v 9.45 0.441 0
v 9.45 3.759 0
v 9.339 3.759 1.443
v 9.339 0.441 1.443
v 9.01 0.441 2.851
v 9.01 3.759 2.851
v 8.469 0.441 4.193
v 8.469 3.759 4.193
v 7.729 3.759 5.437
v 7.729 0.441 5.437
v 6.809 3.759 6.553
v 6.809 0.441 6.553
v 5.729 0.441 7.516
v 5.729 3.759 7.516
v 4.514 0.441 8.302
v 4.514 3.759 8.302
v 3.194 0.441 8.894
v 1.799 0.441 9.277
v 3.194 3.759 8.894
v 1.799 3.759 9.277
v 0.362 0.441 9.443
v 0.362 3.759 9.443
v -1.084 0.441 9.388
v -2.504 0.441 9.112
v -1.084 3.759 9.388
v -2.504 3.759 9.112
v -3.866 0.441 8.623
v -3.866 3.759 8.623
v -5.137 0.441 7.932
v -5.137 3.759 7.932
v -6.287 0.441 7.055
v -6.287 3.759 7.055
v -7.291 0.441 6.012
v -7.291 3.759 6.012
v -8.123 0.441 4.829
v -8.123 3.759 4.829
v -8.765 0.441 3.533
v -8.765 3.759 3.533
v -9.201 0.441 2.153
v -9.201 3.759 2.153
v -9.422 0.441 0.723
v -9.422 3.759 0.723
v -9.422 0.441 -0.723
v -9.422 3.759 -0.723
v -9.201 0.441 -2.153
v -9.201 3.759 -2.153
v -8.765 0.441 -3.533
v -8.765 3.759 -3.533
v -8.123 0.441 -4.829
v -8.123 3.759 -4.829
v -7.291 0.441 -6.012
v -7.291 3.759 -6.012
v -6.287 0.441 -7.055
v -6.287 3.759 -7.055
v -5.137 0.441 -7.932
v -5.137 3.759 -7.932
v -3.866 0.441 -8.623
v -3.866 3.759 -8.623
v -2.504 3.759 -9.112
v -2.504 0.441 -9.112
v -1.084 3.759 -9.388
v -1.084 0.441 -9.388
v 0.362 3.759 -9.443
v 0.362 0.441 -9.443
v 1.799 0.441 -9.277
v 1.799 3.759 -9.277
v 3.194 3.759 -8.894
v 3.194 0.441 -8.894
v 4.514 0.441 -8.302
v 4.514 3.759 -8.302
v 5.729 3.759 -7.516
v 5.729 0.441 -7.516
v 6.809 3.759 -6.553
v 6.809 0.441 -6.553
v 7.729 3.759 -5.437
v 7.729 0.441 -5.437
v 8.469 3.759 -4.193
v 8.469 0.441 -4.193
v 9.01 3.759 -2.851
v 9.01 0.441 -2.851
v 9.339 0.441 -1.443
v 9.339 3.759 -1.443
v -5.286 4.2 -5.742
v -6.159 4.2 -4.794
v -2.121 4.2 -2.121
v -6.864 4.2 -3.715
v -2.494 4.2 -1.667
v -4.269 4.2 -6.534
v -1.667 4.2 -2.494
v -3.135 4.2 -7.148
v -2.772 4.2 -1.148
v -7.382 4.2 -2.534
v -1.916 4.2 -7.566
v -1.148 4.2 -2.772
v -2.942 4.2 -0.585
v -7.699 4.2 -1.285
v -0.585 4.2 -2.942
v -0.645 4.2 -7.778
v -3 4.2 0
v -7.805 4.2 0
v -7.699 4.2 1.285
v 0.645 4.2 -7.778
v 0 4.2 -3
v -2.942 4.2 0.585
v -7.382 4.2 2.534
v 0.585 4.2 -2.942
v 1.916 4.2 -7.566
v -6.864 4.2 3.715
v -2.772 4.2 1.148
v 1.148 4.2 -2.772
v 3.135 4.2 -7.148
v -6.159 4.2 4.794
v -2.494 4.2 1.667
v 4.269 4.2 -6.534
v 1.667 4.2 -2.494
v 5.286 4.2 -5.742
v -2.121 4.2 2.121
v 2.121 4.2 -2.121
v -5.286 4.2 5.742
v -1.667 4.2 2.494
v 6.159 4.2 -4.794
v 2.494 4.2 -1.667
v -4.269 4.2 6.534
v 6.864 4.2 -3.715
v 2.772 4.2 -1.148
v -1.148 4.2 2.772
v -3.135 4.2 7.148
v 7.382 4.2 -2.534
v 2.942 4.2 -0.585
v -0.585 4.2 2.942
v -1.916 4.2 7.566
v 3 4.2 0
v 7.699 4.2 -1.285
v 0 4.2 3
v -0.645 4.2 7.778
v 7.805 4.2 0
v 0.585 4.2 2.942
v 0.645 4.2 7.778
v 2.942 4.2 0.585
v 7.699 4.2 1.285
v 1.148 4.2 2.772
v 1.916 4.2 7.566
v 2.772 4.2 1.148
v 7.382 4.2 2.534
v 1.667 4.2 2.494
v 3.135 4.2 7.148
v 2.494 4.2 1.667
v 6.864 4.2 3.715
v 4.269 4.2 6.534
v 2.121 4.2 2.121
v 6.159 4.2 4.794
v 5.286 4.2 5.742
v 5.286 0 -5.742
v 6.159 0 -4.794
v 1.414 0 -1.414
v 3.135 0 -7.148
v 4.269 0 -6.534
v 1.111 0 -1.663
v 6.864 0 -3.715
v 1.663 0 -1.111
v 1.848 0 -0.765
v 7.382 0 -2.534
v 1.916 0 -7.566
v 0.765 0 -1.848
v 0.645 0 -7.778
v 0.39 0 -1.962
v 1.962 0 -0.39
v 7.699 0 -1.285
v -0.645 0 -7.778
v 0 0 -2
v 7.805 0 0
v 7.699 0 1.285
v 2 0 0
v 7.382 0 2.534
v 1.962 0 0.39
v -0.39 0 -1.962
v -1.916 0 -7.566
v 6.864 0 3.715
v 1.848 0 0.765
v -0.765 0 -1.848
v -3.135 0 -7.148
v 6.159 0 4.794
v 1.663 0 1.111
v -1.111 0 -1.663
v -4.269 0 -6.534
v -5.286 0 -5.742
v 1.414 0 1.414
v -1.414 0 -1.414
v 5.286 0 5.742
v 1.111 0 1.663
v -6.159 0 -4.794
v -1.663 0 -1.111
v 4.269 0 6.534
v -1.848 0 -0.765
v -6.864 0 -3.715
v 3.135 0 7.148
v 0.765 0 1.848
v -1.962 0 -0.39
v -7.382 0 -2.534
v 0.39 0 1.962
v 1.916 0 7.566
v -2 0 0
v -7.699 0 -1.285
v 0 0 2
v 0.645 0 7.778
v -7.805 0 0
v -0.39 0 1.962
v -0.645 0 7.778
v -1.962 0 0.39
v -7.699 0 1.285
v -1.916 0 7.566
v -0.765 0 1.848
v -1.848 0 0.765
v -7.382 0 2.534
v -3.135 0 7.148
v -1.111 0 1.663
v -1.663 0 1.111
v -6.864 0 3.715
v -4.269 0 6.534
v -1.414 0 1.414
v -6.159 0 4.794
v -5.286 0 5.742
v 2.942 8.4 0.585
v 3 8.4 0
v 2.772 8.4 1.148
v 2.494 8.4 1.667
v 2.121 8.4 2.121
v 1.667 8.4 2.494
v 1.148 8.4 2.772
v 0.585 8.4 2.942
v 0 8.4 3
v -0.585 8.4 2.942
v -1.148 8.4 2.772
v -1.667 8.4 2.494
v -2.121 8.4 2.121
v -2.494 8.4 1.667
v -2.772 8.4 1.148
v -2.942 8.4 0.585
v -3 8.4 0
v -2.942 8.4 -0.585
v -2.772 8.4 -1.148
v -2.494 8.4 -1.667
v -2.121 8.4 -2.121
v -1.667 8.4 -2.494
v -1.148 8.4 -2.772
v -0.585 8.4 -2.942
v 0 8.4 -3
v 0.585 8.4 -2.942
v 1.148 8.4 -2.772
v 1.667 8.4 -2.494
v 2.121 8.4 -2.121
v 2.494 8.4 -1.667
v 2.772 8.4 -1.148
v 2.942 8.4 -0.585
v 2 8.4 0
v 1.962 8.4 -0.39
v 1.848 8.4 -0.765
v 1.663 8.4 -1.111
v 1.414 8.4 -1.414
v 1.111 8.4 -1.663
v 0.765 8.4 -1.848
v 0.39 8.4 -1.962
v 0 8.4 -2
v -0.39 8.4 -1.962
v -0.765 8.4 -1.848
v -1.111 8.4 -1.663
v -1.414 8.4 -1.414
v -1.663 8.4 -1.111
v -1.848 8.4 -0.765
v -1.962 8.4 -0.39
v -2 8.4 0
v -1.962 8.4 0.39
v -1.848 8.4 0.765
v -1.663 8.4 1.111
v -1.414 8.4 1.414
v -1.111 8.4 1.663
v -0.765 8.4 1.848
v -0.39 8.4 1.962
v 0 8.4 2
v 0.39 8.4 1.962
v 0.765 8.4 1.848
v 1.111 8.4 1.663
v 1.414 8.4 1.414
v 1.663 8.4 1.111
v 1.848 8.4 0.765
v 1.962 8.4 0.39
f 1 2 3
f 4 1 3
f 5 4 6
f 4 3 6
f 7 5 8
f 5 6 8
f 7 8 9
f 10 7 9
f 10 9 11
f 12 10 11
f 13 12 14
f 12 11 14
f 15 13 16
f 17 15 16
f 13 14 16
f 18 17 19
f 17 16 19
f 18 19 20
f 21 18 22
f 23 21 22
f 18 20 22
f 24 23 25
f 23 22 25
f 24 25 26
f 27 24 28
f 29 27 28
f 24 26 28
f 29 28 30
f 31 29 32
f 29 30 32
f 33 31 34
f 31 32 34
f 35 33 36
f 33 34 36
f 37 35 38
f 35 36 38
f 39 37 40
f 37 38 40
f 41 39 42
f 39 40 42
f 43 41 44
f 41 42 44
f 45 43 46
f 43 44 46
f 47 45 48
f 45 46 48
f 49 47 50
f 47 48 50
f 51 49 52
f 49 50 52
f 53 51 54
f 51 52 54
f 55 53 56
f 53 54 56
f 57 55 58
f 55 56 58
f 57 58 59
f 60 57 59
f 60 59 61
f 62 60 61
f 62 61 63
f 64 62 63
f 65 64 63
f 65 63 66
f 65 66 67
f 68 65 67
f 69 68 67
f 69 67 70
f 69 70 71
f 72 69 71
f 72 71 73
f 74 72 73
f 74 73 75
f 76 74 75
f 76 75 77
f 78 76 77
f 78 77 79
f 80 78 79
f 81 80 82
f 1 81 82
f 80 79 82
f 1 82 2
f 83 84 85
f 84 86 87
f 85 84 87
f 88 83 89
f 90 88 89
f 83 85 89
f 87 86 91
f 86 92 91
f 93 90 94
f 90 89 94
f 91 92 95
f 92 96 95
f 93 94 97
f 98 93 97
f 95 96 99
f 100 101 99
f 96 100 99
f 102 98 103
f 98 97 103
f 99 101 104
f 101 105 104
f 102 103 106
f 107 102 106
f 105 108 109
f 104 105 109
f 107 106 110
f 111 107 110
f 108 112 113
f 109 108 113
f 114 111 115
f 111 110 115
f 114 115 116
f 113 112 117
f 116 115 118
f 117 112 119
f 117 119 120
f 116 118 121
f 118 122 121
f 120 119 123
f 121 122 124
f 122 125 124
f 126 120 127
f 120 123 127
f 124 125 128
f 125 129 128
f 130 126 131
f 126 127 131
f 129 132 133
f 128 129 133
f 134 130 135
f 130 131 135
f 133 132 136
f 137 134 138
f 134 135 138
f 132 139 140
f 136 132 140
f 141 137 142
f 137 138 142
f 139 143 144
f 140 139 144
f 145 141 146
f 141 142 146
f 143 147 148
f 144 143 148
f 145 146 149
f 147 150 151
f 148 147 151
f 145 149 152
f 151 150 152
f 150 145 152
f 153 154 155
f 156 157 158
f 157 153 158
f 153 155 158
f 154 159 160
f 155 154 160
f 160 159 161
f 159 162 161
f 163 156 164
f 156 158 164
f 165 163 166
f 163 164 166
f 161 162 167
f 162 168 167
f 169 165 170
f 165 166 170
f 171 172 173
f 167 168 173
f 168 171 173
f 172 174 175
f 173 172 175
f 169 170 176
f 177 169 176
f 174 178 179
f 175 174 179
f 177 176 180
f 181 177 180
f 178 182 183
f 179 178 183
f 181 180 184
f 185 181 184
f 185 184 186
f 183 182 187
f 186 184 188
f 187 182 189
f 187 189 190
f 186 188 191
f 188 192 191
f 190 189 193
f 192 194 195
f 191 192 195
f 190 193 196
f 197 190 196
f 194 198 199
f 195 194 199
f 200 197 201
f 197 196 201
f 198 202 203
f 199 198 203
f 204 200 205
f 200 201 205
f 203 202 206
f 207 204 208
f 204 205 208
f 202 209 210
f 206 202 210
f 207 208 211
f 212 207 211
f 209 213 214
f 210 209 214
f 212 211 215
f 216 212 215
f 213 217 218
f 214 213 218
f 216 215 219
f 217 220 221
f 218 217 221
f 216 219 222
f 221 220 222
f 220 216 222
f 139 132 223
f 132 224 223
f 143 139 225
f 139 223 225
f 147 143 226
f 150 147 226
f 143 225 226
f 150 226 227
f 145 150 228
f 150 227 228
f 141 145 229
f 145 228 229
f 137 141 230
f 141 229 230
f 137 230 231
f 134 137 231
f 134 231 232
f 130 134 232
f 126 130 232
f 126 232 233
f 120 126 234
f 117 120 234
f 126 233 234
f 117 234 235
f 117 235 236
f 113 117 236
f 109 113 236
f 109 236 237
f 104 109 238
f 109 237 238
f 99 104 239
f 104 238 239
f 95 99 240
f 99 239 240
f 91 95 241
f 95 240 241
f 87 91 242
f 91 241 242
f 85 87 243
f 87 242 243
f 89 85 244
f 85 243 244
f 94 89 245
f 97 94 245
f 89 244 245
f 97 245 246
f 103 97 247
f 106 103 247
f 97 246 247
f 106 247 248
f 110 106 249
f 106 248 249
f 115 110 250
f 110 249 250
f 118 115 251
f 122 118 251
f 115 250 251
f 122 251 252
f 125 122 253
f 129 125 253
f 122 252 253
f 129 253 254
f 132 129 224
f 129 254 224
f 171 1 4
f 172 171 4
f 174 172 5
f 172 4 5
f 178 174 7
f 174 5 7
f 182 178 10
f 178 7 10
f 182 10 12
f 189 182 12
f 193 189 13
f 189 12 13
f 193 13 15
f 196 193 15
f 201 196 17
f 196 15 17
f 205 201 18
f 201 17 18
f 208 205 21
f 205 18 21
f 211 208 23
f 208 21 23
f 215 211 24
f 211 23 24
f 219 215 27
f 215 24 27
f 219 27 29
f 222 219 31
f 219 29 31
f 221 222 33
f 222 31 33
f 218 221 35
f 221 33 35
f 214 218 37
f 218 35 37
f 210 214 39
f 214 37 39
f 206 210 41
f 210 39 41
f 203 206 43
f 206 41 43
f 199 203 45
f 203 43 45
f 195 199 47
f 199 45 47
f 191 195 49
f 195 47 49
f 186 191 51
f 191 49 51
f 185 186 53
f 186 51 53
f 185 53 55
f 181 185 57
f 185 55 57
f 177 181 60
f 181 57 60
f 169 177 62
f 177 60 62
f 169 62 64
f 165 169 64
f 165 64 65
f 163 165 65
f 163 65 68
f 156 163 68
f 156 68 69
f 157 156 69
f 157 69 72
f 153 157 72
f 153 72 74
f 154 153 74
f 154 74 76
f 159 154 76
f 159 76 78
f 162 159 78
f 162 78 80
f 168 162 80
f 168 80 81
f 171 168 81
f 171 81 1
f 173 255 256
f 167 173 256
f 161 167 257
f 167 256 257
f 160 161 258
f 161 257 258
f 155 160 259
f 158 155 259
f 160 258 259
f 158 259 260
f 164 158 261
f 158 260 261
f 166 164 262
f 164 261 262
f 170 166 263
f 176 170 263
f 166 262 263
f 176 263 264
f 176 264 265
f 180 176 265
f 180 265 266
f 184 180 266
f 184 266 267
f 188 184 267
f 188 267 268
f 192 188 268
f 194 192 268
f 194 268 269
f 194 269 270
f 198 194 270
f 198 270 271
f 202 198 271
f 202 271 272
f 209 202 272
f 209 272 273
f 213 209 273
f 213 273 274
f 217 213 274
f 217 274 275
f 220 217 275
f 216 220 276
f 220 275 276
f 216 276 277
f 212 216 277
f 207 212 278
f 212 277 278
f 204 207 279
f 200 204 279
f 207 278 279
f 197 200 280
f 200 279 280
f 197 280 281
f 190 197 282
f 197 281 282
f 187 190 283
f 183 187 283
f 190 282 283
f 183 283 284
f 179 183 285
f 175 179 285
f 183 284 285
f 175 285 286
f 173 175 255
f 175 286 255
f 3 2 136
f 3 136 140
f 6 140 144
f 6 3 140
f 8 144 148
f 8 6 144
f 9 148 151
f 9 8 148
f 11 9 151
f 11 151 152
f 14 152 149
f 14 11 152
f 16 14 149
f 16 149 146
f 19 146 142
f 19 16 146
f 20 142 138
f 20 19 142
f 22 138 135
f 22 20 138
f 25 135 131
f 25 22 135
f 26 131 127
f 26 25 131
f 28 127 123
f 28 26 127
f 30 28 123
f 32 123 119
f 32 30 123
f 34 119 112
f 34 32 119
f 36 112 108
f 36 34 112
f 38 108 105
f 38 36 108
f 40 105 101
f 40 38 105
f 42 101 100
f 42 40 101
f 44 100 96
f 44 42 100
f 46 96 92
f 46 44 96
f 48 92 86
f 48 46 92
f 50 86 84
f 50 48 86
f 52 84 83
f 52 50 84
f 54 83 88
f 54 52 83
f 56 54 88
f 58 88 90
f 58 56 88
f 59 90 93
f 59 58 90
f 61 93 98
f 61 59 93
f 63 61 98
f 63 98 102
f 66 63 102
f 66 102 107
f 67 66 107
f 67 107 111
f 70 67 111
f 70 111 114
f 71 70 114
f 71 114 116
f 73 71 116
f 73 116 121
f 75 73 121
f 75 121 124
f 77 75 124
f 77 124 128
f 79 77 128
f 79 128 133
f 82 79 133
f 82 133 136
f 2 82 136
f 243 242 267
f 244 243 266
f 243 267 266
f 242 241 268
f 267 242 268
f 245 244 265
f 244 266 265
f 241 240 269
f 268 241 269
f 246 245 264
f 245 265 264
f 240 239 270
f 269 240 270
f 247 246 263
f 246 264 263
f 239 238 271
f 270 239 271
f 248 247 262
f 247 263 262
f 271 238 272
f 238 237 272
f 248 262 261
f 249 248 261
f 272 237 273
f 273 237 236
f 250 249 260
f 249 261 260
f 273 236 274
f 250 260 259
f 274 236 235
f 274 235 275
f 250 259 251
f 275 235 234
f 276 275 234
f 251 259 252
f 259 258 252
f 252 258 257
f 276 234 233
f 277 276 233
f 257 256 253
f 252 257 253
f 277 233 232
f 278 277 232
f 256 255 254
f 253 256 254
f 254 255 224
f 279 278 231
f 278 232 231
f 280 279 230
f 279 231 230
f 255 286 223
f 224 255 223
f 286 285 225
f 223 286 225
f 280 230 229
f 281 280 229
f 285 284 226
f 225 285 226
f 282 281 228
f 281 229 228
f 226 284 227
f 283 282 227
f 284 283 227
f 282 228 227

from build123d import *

# Parameters (mm, degrees)
CHAMFER_2_SIZE           = 1.645
CHAMFER_2_SIZE2          = 0.440776422
CHAMFER_3_SIZE           = 1.645
CHAMFER_3_SIZE2          = 0.440776422
SKETCH_4_R               = 2
CUT_EXTRUDE_2_DEPTH      = 1
CUT_EXTRUDE_2_DEPTH_BACK = 9.4


with BuildPart() as part:
    # Эскиз2 → Повернуть2 (revolve)
    with BuildSketch(Plane.XY):
        Polygon((0, 0), (9.45, 0), (9.45, 4.2), (3, 4.2), (3, 8.4), (0, 8.4), align=None)
    revolve(axis=Axis((0, 8.4, 0), (0, -1, 0)))

    # Фаска2
    chamfer_2_edges = [part.edges().sort_by_distance(p)[0] for p in [
        (-9.45, 4.2, 0),
    ]]
    chamfer_2_side = [part.faces().sort_by_distance(p)[0] for p in [
        (-9.182713637, 4.2, 0),
    ]]
    chamfer(chamfer_2_edges, length=CHAMFER_2_SIZE, length2=CHAMFER_2_SIZE2, reference=chamfer_2_side[0])

    # Фаска3
    chamfer_3_edges = [part.edges().sort_by_distance(p)[0] for p in [
        (-9.45, 0, 0),
    ]]
    chamfer_3_side = [part.faces().sort_by_distance(p)[0] for p in [
        (0, 0, 0),
    ]]
    chamfer(chamfer_3_edges, length=CHAMFER_3_SIZE, length2=CHAMFER_3_SIZE2, reference=chamfer_3_side[0])

    # Эскиз4 → Вырез-Вытянуть2 (cut, two sides)
    with BuildSketch(Plane(origin=(0, 8.4, 0), x_dir=(1, 0, 0), z_dir=(0, 1, 0))) as cut_extrude_2_sk:
        Circle(SKETCH_4_R)
    extrude(amount=CUT_EXTRUDE_2_DEPTH, mode=Mode.SUBTRACT)
    extrude(cut_extrude_2_sk.sketch, amount=-CUT_EXTRUDE_2_DEPTH_BACK, mode=Mode.SUBTRACT)


solid = part.part
